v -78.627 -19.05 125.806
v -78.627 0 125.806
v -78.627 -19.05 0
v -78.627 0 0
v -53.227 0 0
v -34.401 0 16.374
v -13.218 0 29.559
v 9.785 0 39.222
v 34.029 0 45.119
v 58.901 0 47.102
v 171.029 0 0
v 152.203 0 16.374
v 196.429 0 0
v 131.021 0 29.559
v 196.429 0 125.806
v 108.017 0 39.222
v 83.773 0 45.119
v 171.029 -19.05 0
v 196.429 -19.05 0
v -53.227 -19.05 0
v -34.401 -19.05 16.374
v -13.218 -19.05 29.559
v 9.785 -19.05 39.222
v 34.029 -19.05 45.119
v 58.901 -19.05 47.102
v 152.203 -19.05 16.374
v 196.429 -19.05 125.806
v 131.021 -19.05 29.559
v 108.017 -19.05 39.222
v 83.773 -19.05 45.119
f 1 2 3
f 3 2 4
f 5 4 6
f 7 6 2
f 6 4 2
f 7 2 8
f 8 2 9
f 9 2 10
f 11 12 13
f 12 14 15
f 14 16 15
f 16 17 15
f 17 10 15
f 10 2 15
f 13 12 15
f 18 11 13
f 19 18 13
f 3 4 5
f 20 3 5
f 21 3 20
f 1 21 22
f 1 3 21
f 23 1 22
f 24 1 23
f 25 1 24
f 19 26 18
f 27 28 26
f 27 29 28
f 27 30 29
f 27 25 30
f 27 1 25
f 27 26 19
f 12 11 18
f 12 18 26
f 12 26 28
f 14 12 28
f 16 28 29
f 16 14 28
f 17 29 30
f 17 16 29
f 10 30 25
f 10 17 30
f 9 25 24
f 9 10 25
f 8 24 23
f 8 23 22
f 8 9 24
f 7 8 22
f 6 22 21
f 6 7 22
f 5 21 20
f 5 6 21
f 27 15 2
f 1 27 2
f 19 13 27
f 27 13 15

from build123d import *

# Parameters (mm, degrees)
F1_DEPTH = 19.05
F2_DEPTH = 19.05


with BuildPart() as f1:
    # F0 (on Front) → F1 (new body)
    with BuildSketch(Plane.XZ):
        with BuildLine():
            Line((171.029483, 0), (196.429483, 0))
            Line((196.429483, 0), (196.429483, 125.8062))
            Line((196.429483, 125.8062), (171.029483, 125.8062))
            Line((171.029483, 125.8062), (-53.227117, 125.8062))
            Line((-53.227117, 125.8062), (-78.627117, 125.8062))
            Line((-78.627117, 125.8062), (-78.627117, 0))
            Line((-78.627117, 0), (-53.227117, 0))
            ThreePointArc((-53.227117, 0), (58.901183, 47.101938), (171.029483, 0))
        make_face()
        with BuildLine():
            Line((69.962883, 0), (171.029483, 0))
            ThreePointArc((171.029483, 0), (58.901183, 47.101938), (-53.227117, 0))
            Line((-53.227117, 0), (69.962883, 0))
        make_face()
    extrude(amount=F1_DEPTH)

    # F0 (on Front) → F2 (cut)
    with BuildSketch(Plane.XZ):
        with BuildLine():
            Line((69.962883, 0), (171.029483, 0))
            ThreePointArc((171.029483, 0), (58.901183, 47.101938), (-53.227117, 0))
            Line((-53.227117, 0), (69.962883, 0))
        make_face()
    extrude(amount=F2_DEPTH, mode=Mode.SUBTRACT)


solid = f1.part
